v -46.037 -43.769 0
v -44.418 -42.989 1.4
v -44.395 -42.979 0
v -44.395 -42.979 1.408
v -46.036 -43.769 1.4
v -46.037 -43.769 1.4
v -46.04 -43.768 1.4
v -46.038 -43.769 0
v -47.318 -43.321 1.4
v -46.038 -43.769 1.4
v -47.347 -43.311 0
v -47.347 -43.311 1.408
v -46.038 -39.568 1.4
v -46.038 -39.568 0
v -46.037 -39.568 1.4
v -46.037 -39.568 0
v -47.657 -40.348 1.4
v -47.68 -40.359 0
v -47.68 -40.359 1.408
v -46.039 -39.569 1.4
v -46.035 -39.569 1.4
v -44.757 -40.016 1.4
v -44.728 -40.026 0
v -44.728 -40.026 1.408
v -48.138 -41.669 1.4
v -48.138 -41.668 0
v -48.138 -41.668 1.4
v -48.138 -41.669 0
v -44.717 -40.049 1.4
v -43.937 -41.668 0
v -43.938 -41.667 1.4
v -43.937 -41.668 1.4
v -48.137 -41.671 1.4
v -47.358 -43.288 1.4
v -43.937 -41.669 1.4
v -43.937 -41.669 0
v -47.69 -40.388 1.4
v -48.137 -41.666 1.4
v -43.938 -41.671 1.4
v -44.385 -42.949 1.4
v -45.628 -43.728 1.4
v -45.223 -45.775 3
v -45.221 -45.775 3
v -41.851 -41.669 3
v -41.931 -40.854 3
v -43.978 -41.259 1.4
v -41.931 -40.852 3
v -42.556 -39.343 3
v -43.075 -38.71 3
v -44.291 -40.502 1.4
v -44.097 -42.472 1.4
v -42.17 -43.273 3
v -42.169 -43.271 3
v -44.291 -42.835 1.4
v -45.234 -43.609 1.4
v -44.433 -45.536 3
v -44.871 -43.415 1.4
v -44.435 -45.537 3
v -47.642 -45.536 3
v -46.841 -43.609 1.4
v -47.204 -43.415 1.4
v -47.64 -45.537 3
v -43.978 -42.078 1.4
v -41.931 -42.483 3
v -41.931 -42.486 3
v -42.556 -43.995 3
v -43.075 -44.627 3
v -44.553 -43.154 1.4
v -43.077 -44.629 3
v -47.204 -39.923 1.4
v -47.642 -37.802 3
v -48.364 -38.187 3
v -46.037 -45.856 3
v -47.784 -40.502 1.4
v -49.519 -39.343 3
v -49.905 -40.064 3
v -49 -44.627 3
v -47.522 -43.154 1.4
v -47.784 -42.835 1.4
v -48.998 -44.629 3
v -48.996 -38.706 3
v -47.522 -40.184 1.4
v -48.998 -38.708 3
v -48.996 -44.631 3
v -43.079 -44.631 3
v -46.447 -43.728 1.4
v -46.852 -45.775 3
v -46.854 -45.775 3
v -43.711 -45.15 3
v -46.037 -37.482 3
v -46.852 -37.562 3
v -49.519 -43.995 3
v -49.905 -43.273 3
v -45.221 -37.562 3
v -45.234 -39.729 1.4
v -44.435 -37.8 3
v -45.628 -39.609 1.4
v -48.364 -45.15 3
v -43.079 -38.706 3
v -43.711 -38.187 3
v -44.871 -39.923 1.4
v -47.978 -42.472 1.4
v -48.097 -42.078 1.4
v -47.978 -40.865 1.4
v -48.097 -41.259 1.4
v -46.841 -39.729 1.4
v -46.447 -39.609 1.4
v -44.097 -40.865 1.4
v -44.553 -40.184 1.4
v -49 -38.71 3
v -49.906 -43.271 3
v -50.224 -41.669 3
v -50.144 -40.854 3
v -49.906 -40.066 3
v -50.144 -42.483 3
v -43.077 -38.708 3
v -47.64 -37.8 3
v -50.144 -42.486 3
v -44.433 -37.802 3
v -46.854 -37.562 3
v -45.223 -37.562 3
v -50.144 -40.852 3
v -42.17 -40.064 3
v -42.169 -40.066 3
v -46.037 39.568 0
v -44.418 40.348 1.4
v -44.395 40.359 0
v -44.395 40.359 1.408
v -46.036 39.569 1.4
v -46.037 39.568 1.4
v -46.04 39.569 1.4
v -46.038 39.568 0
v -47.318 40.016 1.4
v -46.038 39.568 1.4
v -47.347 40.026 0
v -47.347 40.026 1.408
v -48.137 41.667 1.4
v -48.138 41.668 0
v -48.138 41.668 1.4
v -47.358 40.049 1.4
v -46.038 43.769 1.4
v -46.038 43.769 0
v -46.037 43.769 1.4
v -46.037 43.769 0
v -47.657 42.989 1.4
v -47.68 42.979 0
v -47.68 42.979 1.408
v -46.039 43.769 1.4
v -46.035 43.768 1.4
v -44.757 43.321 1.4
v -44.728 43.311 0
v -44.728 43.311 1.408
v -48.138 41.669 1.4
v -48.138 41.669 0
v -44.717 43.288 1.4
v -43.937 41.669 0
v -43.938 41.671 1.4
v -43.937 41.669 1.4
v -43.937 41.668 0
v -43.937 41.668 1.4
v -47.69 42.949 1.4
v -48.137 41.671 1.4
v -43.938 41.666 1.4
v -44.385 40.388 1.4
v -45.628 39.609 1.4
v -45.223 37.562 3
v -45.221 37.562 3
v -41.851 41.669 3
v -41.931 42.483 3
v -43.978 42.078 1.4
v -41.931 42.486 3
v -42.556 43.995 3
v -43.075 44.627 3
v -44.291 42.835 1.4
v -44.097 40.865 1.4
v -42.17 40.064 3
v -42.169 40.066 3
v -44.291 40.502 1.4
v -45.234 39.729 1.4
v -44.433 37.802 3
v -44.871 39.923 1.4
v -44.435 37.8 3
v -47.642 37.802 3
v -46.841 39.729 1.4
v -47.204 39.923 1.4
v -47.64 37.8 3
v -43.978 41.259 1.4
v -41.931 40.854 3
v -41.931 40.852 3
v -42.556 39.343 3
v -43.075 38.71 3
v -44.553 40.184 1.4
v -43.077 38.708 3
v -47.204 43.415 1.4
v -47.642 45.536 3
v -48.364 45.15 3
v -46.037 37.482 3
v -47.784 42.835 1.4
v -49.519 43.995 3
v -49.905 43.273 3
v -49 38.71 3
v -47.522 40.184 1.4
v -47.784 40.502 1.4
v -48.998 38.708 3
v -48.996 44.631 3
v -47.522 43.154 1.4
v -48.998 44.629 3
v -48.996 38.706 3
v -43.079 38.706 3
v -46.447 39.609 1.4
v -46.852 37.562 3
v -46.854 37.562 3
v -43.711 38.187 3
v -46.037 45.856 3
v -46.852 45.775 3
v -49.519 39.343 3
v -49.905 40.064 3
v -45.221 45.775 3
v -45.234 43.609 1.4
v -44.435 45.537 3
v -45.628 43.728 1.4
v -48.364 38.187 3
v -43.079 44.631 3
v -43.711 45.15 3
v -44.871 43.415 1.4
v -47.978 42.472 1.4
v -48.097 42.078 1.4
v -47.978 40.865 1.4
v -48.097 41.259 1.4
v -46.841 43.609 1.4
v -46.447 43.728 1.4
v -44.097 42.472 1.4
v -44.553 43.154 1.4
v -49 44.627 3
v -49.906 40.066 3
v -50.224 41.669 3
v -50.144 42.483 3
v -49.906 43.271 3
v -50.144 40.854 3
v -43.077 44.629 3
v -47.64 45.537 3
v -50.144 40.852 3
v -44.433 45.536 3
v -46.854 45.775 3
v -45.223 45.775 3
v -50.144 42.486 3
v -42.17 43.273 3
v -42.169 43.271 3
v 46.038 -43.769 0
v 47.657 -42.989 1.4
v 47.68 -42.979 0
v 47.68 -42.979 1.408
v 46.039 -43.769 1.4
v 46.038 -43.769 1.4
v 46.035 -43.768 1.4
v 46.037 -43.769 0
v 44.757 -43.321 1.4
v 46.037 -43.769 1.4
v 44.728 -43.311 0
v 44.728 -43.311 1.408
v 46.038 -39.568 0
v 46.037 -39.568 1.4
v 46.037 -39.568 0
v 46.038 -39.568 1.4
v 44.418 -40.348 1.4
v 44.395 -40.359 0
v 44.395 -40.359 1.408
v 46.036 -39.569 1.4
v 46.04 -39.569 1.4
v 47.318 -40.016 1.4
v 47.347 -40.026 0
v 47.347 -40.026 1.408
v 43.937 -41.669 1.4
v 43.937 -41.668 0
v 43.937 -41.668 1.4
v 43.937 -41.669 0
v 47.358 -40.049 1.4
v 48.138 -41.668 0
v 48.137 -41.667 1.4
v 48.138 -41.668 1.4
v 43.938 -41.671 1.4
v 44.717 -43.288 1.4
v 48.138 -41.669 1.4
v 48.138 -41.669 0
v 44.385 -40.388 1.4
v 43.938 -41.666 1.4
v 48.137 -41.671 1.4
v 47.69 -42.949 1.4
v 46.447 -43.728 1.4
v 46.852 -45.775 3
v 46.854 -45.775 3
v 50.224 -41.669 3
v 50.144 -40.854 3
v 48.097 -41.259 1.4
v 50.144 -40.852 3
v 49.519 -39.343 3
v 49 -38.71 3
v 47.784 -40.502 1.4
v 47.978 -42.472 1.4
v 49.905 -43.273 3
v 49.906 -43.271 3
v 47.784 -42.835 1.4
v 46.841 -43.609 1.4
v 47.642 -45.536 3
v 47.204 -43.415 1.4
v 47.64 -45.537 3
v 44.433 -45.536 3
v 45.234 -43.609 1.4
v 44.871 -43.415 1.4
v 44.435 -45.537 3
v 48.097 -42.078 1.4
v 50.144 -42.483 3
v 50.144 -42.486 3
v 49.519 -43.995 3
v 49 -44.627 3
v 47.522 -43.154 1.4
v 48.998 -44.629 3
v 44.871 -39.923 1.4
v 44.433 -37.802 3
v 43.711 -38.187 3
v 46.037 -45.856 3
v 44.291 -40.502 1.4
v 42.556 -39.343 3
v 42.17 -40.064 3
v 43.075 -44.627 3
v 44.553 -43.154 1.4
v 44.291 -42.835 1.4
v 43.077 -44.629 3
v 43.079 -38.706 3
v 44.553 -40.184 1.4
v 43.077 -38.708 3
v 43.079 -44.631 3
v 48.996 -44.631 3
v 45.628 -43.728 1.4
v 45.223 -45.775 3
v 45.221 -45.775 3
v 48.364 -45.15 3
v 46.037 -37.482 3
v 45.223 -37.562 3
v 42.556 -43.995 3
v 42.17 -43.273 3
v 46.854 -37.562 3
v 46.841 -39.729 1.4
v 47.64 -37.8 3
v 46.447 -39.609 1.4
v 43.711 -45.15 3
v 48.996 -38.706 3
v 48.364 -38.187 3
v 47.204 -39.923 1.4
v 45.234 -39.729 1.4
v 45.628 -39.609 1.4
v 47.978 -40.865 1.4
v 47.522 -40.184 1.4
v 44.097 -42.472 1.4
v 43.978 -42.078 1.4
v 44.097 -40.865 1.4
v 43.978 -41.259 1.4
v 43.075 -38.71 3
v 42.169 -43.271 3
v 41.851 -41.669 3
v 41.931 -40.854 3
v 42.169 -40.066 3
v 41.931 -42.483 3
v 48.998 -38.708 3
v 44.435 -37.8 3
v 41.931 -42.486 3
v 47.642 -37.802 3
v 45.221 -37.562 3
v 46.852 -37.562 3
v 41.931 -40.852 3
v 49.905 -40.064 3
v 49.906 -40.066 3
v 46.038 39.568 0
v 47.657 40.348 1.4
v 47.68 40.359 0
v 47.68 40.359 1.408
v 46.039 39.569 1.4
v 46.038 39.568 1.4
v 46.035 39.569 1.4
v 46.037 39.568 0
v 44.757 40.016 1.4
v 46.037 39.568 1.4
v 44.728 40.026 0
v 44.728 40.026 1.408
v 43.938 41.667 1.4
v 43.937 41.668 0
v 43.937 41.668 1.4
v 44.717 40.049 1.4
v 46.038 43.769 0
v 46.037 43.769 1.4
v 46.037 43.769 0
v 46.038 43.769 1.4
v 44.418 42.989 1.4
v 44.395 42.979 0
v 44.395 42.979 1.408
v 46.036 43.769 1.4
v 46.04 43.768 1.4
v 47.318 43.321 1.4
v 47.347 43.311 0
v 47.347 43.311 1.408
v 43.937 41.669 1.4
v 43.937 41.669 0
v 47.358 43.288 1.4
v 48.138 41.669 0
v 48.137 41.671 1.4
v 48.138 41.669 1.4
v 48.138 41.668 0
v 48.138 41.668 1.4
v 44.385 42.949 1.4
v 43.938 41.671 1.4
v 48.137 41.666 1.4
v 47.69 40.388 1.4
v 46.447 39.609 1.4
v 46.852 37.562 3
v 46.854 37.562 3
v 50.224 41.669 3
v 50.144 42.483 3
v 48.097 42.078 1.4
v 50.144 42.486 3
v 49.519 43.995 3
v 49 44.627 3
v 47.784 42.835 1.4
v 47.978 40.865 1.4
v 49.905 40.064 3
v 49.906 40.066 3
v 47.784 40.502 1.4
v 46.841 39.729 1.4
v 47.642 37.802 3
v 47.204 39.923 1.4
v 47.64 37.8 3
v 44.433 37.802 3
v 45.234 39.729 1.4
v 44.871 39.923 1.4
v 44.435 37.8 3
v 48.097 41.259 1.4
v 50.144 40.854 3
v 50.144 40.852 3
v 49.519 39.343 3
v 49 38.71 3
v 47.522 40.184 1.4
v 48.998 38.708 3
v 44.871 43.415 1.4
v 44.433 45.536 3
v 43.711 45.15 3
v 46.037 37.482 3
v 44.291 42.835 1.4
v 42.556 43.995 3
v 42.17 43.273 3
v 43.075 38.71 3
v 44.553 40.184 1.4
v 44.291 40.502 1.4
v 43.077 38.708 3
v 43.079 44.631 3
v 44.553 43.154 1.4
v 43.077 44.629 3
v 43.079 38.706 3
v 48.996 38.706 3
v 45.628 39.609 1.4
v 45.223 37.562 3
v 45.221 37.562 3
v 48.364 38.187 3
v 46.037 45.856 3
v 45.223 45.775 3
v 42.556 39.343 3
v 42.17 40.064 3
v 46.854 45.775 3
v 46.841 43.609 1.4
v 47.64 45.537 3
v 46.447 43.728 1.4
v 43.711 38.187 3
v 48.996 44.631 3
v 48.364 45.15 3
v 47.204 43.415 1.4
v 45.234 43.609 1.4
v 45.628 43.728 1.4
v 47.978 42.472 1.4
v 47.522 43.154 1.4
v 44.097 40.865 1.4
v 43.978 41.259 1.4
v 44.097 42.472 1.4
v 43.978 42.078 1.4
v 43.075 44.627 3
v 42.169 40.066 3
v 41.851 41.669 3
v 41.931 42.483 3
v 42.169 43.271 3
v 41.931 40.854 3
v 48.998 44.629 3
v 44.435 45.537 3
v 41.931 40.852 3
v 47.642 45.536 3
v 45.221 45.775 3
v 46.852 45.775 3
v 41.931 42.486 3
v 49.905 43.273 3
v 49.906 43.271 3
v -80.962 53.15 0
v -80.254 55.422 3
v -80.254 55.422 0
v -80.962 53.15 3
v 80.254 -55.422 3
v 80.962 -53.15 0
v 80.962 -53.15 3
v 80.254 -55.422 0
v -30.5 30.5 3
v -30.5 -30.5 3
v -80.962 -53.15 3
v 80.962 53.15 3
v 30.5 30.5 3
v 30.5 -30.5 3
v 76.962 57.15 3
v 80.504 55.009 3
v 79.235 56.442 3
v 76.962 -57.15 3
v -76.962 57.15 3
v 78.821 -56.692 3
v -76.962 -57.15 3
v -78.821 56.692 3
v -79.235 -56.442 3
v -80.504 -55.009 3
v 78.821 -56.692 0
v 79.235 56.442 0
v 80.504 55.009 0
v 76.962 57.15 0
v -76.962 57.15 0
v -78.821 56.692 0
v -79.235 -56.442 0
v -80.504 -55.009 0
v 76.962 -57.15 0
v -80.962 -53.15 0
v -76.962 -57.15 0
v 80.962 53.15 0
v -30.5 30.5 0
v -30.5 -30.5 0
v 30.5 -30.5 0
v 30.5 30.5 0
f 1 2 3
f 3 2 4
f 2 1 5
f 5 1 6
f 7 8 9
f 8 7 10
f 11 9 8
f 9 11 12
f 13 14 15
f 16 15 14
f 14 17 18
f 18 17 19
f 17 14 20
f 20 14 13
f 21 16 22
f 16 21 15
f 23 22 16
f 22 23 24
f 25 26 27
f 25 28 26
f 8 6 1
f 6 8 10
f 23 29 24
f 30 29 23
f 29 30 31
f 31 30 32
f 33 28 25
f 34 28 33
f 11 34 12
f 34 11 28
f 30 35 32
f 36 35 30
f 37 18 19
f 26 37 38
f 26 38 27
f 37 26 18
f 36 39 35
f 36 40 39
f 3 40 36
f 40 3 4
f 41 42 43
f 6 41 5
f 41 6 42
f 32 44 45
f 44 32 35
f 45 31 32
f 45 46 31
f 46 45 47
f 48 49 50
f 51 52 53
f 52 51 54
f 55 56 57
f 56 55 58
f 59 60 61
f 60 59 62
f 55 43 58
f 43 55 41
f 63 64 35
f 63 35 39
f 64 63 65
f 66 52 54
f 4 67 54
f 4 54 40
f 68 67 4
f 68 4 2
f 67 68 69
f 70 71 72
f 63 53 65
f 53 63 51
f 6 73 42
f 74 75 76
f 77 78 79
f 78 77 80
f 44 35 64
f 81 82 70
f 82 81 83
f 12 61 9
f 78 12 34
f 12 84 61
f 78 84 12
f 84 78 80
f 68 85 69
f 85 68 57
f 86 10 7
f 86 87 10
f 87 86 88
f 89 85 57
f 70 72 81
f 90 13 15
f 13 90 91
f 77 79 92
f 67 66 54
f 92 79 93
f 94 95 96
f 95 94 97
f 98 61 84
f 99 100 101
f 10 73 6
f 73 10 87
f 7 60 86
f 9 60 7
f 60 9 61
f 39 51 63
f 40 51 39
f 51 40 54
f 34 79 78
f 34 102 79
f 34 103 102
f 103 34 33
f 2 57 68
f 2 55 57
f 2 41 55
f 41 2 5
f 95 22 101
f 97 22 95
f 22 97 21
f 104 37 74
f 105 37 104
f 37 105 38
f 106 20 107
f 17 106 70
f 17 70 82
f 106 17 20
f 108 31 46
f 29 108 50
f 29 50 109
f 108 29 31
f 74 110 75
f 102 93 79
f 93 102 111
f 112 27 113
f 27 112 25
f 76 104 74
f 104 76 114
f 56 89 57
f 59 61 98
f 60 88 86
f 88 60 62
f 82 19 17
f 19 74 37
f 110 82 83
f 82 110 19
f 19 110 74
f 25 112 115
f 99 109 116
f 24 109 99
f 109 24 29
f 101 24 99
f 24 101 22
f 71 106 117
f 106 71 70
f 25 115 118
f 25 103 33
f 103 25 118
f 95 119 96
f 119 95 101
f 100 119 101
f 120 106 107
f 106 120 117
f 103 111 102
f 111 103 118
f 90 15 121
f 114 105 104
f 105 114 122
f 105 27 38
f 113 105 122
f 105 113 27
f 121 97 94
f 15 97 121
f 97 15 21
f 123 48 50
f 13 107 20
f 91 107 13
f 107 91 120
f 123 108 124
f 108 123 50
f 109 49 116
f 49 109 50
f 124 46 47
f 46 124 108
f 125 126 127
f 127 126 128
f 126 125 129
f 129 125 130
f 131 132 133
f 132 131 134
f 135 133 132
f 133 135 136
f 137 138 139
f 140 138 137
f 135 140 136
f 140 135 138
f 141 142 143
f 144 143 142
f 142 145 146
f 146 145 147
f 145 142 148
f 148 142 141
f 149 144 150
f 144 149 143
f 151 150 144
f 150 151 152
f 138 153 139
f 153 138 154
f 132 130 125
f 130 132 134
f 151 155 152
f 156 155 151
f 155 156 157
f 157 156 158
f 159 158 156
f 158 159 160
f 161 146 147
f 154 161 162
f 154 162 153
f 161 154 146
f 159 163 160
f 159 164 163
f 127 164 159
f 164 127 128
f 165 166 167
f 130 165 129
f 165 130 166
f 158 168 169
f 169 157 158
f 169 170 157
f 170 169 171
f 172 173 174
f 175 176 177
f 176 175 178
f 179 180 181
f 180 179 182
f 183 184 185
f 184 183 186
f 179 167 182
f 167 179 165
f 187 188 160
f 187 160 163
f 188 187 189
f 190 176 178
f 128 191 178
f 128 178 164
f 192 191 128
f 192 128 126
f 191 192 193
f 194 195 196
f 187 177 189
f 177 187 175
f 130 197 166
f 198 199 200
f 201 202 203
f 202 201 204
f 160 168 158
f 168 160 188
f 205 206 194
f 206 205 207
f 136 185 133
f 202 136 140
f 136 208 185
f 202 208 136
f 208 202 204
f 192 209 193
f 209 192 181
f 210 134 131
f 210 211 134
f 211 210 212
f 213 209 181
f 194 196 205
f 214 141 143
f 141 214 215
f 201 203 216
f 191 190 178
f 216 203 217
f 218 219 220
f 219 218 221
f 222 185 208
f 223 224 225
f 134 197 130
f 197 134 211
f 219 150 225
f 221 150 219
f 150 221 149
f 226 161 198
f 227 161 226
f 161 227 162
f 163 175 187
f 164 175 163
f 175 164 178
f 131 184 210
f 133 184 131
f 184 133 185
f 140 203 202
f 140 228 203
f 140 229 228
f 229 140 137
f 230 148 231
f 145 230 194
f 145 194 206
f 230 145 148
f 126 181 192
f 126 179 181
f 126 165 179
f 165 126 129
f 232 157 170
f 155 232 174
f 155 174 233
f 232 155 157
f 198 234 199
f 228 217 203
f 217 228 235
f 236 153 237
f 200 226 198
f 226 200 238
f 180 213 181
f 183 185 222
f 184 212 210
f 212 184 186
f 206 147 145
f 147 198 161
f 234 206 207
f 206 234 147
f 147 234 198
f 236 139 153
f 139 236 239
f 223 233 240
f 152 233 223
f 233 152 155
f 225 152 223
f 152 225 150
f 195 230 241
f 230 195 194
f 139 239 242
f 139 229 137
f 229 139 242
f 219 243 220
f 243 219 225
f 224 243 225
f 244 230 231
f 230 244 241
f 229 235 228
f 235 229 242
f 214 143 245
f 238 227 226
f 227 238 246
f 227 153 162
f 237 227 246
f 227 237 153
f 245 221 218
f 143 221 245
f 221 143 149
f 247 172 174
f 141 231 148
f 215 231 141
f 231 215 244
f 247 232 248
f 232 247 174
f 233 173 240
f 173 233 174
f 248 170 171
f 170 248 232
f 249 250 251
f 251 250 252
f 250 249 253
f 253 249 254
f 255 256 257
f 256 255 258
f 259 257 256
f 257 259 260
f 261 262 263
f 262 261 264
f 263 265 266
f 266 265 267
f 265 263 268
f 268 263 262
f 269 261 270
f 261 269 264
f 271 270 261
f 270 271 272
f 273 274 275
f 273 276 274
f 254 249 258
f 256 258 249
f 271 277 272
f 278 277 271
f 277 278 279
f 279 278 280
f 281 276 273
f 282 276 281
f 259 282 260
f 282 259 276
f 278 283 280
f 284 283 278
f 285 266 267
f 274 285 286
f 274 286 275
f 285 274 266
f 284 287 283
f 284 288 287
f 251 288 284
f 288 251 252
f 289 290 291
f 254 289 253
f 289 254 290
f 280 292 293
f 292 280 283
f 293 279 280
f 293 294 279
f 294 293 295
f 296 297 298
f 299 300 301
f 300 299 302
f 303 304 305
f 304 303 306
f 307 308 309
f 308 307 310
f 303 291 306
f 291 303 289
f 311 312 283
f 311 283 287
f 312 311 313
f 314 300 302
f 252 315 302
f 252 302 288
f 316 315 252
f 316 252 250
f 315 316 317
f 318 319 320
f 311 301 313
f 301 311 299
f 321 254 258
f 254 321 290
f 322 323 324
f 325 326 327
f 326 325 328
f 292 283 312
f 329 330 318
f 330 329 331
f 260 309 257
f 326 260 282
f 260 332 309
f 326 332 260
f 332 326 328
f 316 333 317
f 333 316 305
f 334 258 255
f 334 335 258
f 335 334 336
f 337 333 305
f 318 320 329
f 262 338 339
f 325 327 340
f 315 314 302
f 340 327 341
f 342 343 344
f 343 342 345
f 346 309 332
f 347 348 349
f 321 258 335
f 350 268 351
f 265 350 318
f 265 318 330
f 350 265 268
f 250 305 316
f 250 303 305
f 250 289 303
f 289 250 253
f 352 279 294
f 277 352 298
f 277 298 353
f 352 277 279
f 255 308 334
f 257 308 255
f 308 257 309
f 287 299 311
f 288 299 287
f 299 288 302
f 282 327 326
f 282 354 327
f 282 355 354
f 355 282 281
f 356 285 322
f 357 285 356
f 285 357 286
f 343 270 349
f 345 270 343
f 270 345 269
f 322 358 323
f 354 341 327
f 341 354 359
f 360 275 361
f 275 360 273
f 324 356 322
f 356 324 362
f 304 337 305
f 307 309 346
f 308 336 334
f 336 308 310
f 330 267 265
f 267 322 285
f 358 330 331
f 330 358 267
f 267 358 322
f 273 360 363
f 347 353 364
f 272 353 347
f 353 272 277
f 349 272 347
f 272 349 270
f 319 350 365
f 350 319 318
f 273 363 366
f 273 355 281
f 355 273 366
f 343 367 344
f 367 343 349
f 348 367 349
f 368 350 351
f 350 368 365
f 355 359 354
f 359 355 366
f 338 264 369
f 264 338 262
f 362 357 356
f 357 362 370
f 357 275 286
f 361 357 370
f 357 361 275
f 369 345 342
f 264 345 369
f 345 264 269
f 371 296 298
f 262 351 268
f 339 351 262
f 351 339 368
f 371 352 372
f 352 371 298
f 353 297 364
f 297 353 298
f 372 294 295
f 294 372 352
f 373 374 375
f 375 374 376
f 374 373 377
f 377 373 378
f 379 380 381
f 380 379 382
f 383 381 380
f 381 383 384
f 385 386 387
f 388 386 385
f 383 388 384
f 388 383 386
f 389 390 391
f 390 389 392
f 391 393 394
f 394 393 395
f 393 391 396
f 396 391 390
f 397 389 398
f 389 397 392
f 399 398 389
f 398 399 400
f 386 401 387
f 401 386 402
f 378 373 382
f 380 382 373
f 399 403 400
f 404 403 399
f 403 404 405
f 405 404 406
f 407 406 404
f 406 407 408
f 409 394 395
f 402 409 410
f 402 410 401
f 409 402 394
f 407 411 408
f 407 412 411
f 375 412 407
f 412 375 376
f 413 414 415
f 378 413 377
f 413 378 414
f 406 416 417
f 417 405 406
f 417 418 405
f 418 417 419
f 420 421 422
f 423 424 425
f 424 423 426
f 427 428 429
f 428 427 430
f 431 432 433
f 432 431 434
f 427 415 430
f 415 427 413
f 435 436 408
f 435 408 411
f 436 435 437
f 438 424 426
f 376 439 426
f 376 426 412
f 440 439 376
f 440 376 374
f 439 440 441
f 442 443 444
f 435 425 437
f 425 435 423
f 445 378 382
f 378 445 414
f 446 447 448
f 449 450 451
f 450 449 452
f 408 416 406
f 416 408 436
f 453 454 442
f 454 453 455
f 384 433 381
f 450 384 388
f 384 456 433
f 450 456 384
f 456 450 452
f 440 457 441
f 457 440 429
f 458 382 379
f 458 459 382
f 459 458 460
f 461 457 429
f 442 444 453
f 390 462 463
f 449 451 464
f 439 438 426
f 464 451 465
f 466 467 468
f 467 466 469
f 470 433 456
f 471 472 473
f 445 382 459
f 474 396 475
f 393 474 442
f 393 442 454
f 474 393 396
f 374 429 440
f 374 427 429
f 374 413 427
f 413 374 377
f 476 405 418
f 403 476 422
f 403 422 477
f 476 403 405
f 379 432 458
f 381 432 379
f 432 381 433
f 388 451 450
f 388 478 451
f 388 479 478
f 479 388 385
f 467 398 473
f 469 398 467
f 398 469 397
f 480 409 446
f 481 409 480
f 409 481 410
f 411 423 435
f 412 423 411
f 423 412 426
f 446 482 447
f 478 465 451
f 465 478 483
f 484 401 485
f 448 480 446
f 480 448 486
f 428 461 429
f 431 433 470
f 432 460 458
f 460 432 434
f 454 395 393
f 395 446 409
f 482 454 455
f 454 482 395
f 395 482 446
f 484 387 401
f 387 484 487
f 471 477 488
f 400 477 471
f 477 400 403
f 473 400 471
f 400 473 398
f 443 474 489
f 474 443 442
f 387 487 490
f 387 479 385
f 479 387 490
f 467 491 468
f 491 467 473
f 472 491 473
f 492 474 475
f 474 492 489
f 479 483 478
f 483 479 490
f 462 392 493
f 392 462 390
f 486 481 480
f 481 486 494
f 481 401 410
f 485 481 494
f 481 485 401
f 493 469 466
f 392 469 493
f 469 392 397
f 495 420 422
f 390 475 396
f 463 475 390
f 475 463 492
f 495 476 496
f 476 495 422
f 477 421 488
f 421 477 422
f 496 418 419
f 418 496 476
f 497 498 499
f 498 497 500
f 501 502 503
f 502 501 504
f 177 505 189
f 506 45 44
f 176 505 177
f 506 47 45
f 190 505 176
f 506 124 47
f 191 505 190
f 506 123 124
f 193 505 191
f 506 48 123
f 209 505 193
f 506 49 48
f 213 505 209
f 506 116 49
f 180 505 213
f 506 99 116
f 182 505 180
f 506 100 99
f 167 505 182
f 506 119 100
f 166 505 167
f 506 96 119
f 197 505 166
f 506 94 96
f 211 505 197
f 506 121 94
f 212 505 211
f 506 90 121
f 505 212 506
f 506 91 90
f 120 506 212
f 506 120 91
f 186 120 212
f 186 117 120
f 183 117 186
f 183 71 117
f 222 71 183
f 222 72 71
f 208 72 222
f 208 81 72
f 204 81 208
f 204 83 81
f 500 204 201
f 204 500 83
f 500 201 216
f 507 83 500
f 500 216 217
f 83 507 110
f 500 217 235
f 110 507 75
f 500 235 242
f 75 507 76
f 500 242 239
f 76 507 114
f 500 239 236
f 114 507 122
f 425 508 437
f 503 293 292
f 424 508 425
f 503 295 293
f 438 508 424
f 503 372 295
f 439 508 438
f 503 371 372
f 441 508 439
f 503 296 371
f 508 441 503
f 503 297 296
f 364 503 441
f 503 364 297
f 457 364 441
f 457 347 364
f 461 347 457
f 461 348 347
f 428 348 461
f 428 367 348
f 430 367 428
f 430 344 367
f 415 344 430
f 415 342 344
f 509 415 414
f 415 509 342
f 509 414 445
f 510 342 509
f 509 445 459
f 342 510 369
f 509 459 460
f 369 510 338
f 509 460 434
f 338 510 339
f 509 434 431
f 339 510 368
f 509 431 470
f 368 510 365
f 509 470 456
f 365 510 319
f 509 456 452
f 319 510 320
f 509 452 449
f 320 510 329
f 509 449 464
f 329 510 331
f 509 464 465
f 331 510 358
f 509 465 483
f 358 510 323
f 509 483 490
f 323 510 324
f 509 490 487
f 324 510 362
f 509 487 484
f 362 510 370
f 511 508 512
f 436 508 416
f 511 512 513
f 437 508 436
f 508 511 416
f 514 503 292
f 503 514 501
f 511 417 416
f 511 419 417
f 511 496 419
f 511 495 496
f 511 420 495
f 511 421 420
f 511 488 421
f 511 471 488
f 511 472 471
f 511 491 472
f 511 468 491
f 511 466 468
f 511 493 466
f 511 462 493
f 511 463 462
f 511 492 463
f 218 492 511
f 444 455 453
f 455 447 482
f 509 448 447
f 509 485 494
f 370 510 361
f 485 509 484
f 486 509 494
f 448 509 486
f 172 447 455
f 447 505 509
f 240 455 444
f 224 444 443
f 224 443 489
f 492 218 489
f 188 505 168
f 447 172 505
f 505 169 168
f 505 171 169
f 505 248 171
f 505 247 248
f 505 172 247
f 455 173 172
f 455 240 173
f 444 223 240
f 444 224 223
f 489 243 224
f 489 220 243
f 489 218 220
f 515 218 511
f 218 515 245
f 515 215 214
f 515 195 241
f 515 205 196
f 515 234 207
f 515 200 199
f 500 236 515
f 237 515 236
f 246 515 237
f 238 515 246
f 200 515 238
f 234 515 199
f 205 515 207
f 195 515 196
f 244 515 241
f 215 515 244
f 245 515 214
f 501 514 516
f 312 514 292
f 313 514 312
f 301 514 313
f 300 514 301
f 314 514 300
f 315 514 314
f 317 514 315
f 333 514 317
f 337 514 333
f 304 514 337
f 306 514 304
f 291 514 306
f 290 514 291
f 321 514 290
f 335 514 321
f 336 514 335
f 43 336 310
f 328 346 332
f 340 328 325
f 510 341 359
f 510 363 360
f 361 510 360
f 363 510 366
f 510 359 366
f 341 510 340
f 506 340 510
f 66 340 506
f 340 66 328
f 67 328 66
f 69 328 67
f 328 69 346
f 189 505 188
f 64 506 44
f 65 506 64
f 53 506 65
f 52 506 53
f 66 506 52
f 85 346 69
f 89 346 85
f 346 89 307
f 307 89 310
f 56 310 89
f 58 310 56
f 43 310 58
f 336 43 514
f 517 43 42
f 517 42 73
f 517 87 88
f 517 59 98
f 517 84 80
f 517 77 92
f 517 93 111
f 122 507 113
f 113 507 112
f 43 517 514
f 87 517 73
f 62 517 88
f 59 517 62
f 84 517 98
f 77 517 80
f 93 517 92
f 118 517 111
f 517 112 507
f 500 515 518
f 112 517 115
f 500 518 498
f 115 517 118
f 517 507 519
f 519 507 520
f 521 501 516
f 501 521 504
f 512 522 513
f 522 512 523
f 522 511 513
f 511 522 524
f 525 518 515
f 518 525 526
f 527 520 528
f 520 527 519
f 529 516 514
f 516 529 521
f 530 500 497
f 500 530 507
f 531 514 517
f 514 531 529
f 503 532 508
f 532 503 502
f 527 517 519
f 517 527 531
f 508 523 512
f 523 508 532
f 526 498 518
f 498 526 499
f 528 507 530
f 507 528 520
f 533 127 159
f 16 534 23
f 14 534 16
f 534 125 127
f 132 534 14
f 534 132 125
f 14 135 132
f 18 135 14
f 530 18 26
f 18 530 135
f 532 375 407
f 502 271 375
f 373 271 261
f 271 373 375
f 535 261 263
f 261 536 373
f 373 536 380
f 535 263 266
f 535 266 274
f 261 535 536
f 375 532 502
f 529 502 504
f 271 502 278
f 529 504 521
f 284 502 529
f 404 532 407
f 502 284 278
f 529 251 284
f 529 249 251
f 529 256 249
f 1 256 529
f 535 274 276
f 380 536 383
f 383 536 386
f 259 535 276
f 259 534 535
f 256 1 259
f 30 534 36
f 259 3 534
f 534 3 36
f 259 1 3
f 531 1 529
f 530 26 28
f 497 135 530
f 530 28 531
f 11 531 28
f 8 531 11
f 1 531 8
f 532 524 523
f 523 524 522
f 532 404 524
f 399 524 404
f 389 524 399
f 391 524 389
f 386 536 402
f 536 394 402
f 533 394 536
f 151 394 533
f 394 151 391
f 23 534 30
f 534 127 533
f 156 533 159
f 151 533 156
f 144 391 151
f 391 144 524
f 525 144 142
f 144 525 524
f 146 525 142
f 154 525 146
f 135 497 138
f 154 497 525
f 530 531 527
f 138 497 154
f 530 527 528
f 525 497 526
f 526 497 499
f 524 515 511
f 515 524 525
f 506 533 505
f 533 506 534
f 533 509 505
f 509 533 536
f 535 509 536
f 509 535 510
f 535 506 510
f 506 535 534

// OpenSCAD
/*
===========================================================================
Name        : wallplate_3gang.scad
Author      : Brandon Van Pelt
Description : 3-gang wall plate carrying the LightCraft panel (Guition
              ESP32-4848S040) on the room's existing 3-gang metal box.

              REV 3 -- after the first full-size test print.

              CONFIRMED CORRECT on hardware:
                - plate face 6.375" x 4.500" matches the stock 3-gang cover
                - ear hole spacing on BOTH axes: 1.8125" gang pitch and the
                  3.281" device spacing

              A NOTE ON THE 3.281", because it is genuinely confusing: a
              switch strap has TWO pairs of holes. The pair the stock wall
              plate screws into is ~55.5mm apart. The pair that bolts the
              strap to the BOX EARS is 3.281" (83.34mm) apart. We are pulling
              the switches out and bolting this plate straight to those box
              ears, so 83.34 is the number that matters. Measuring the stock
              plate gives the other pair and sends you off by 28mm -- it cost
              a revision here, so it is written down.

              CORRECTED in this revision:
                - ear holes widened 3.6 -> 4.2 (3.6 printed too tight for 6-32)
                - opening 50 -> 61 for the measured 60 x 60 panel enclosure

              TWO SILENT FAILURE MODES, both now asserted against. Each one
              renders a perfectly valid-looking plate that cannot mount
              anything, so neither is obvious from a preview:
                1. An opening larger than the panel screw circle deletes the
                   screw bosses.
                2. An ear screw lying inside the opening is deleted by it.
                   This is why screw_mode = 2 is unusable at a 61mm opening:
                   the centre gang's ears sit at x = 0, inside the hole.
                   Use screw_mode = 4.

              PRINT: front face DOWN, support-free. 4-5 perimeters, 0.2mm.
              MATERIAL: not plain PLA -- see the note at the end.
===========================================================================
*/

inch = 25.4;

// --- Plate face (confirmed against the stock cover) ------------------------
plate_w  = 6.375 * inch;    // 161.93
plate_h  = 4.500 * inch;    // 114.30
plate_t  = 3.0;
corner_r = 4.0;

// --- Box mounting ---------------------------------------------------------
// Device standard, i.e. the spacing of the switch strap's BOX-MOUNTING holes.
// See the note in the header before "correcting" this against a stock plate.
ear_dy     = 3.281 * inch;  // 83.34 -- confirmed correct
gang_pitch = 1.8125 * inch; // 46.04 -- confirmed correct

// 2 = centre gang, 4 = outer gangs, 6 = all three. At this ear_dy the centre
// gang clears the 61mm opening, so all six positions are usable; 4 is plenty.
screw_mode = 4;

screw_d         = 4.2;      // 6-32 clearance; 3.6 printed too tight
ear_slot_travel = 0.0;      // spacing is known, so round hole + conical sink
csink_d         = 8.4;
csink_h         = 1.6;

// --- Panel opening --------------------------------------------------------
// Measured enclosure is 60 x 60, plus 0.5 clearance per side.
opening_w = 61.0;
opening_h = 61.0;

// --- Panel retention -----------------------------------------------------
// OFF until the panel's own mounting hole spacing is known. At a 61mm opening
// the bosses must be outboard of it: panel_screw_dx > 61 + panel_screw_d +
// 2*wall, i.e. about 67mm minimum.
with_bosses    = false;
panel_screw_dx = 70.0;
panel_screw_dy = 70.0;
panel_screw_d  = 2.8;       // 2.8 self-taps M3; 3.2 for clearance
boss_d = 7.5;
boss_h = 4.0;
wall   = 1.5;               // minimum material around any hole

// ---------------------------------------------------------------------------

ear_xs = (screw_mode == 2) ? [0]
       : (screw_mode == 4) ? [-gang_pitch, gang_pitch]
       :                     [-gang_pitch, 0, gang_pitch];

// Failure mode 1: the opening swallowing the panel screw bosses.
assert(!with_bosses || opening_w <= panel_screw_dx - panel_screw_d - 2 * wall,
       "opening_w too large for panel_screw_dx -- the opening consumes the bosses");
assert(!with_bosses || opening_h <= panel_screw_dy - panel_screw_d - 2 * wall,
       "opening_h too large for panel_screw_dy -- the opening consumes the bosses");

// Failure mode 2: an ear screw lying inside the opening.
keep_out_w = opening_w / 2 + screw_d / 2 + ear_slot_travel / 2 + wall;
keep_out_h = opening_h / 2 + screw_d / 2 + ear_slot_travel / 2 + wall;
assert(min([for (x = ear_xs) abs(x)]) >= keep_out_w
       || ear_dy / 2 >= keep_out_h,
       "an ear screw falls inside the opening -- use screw_mode=4 or shrink the opening");

module rrect(w, h, r, t)
{
    linear_extrude(t)
        offset(r = r)
            square([w - 2 * r, h - 2 * r], center = true);
}

// Vertical slot: a round end of `d` swept `travel` along Y. travel = 0 gives
// a plain circle.
module vslot(d, travel, h)
{
    linear_extrude(h)
        offset(r = d / 2)
            square([0.001, max(travel, 0.001)], center = true);
}

module plate()
{
    difference()
    {
        union()
        {
            rrect(plate_w, plate_h, corner_r, plate_t);

            if (with_bosses)
                for (sx = [-1, 1])
                    for (sy = [-1, 1])
                        translate([sx * panel_screw_dx / 2,
                                   sy * panel_screw_dy / 2, -boss_h])
                            cylinder(h = boss_h + plate_t, d = boss_d, $fn = 48);
        }

        // Panel opening.
        translate([0, 0, -boss_h - 1])
            linear_extrude(boss_h + plate_t + 2)
                square([opening_w, opening_h], center = true);

        // Panel screws, entered from the front into the bosses.
        if (with_bosses)
            for (sx = [-1, 1])
                for (sy = [-1, 1])
                    translate([sx * panel_screw_dx / 2,
                               sy * panel_screw_dy / 2, -boss_h - 1])
                        cylinder(h = boss_h + plate_t + 2,
                                 d = panel_screw_d, $fn = 32);

        // Box ear screws.
        for (x = ear_xs)
            for (sy = [-1, 1])
                translate([x, sy * ear_dy / 2, 0])
                {
                    translate([0, 0, -boss_h - 1])
                        vslot(screw_d, ear_slot_travel, boss_h + plate_t + 2);

                    if (ear_slot_travel > 0)
                        // A slot cannot take a cone, so counterbore instead.
                        // Oval-head plate screws still sit at or below flush.
                        translate([0, 0, plate_t - csink_h])
                            vslot(csink_d, ear_slot_travel, csink_h + 1);
                    else
                        translate([0, 0, plate_t - csink_h])
                            cylinder(h = csink_h + 0.01,
                                     d1 = screw_d, d2 = csink_d, $fn = 32);
                }
    }
}

plate();

/*
---------------------------------------------------------------------------
STILL OPEN: how the panel is retained.

The enclosure is 60 x 60 and the bezel is 86.5 x 86.5, so with a 61mm opening
the bezel overlaps the plate by about 13mm all round -- plenty of landing
area. What is not yet known is whether the panel's own mounting holes can be
used. If those holes sit at roughly 60mm centres (the 86-box standard) they
fall INSIDE a 61mm opening and are unusable, which leaves two options:

  A. PROUD MOUNT -- shrink the opening to a wire pass-through (say 30 x 20),
     let the panel sit entirely on the plate face, and screw into bosses at
     the panel's real hole spacing. One piece, simple, panel stands ~17mm off
     the wall.

  B. CLAMPED MOUNT -- keep the 61mm opening so the body drops into the box,
     thicken the plate to ~5mm with a 2.5mm recess for the bezel, and add a
     rear retainer frame that screws to the plate and traps the bezel flange.
     Two pieces, nearly flush.

---------------------------------------------------------------------------
MATERIAL

This plate covers a box containing mains splices and a switching supply, in a
sealed metal enclosure with no airflow.

Do NOT use plain PLA: glass transition around 55-60C, and it is not flame
retardant. In order of preference:
  - ABS-FR or ASA rated UL94 V-0   (best; enclosed printer)
  - PETG-FR / "FRJet" V-0          (nearly as good, open printer is fine)
  - plain ASA or ABS               (temperature fine, flammability not)

"Tested to UL94 V-0" is not the same as a UL certification with a Yellow
Card. For a part sitting against mains, buy from a vendor that publishes the
actual rating.
---------------------------------------------------------------------------
*/
